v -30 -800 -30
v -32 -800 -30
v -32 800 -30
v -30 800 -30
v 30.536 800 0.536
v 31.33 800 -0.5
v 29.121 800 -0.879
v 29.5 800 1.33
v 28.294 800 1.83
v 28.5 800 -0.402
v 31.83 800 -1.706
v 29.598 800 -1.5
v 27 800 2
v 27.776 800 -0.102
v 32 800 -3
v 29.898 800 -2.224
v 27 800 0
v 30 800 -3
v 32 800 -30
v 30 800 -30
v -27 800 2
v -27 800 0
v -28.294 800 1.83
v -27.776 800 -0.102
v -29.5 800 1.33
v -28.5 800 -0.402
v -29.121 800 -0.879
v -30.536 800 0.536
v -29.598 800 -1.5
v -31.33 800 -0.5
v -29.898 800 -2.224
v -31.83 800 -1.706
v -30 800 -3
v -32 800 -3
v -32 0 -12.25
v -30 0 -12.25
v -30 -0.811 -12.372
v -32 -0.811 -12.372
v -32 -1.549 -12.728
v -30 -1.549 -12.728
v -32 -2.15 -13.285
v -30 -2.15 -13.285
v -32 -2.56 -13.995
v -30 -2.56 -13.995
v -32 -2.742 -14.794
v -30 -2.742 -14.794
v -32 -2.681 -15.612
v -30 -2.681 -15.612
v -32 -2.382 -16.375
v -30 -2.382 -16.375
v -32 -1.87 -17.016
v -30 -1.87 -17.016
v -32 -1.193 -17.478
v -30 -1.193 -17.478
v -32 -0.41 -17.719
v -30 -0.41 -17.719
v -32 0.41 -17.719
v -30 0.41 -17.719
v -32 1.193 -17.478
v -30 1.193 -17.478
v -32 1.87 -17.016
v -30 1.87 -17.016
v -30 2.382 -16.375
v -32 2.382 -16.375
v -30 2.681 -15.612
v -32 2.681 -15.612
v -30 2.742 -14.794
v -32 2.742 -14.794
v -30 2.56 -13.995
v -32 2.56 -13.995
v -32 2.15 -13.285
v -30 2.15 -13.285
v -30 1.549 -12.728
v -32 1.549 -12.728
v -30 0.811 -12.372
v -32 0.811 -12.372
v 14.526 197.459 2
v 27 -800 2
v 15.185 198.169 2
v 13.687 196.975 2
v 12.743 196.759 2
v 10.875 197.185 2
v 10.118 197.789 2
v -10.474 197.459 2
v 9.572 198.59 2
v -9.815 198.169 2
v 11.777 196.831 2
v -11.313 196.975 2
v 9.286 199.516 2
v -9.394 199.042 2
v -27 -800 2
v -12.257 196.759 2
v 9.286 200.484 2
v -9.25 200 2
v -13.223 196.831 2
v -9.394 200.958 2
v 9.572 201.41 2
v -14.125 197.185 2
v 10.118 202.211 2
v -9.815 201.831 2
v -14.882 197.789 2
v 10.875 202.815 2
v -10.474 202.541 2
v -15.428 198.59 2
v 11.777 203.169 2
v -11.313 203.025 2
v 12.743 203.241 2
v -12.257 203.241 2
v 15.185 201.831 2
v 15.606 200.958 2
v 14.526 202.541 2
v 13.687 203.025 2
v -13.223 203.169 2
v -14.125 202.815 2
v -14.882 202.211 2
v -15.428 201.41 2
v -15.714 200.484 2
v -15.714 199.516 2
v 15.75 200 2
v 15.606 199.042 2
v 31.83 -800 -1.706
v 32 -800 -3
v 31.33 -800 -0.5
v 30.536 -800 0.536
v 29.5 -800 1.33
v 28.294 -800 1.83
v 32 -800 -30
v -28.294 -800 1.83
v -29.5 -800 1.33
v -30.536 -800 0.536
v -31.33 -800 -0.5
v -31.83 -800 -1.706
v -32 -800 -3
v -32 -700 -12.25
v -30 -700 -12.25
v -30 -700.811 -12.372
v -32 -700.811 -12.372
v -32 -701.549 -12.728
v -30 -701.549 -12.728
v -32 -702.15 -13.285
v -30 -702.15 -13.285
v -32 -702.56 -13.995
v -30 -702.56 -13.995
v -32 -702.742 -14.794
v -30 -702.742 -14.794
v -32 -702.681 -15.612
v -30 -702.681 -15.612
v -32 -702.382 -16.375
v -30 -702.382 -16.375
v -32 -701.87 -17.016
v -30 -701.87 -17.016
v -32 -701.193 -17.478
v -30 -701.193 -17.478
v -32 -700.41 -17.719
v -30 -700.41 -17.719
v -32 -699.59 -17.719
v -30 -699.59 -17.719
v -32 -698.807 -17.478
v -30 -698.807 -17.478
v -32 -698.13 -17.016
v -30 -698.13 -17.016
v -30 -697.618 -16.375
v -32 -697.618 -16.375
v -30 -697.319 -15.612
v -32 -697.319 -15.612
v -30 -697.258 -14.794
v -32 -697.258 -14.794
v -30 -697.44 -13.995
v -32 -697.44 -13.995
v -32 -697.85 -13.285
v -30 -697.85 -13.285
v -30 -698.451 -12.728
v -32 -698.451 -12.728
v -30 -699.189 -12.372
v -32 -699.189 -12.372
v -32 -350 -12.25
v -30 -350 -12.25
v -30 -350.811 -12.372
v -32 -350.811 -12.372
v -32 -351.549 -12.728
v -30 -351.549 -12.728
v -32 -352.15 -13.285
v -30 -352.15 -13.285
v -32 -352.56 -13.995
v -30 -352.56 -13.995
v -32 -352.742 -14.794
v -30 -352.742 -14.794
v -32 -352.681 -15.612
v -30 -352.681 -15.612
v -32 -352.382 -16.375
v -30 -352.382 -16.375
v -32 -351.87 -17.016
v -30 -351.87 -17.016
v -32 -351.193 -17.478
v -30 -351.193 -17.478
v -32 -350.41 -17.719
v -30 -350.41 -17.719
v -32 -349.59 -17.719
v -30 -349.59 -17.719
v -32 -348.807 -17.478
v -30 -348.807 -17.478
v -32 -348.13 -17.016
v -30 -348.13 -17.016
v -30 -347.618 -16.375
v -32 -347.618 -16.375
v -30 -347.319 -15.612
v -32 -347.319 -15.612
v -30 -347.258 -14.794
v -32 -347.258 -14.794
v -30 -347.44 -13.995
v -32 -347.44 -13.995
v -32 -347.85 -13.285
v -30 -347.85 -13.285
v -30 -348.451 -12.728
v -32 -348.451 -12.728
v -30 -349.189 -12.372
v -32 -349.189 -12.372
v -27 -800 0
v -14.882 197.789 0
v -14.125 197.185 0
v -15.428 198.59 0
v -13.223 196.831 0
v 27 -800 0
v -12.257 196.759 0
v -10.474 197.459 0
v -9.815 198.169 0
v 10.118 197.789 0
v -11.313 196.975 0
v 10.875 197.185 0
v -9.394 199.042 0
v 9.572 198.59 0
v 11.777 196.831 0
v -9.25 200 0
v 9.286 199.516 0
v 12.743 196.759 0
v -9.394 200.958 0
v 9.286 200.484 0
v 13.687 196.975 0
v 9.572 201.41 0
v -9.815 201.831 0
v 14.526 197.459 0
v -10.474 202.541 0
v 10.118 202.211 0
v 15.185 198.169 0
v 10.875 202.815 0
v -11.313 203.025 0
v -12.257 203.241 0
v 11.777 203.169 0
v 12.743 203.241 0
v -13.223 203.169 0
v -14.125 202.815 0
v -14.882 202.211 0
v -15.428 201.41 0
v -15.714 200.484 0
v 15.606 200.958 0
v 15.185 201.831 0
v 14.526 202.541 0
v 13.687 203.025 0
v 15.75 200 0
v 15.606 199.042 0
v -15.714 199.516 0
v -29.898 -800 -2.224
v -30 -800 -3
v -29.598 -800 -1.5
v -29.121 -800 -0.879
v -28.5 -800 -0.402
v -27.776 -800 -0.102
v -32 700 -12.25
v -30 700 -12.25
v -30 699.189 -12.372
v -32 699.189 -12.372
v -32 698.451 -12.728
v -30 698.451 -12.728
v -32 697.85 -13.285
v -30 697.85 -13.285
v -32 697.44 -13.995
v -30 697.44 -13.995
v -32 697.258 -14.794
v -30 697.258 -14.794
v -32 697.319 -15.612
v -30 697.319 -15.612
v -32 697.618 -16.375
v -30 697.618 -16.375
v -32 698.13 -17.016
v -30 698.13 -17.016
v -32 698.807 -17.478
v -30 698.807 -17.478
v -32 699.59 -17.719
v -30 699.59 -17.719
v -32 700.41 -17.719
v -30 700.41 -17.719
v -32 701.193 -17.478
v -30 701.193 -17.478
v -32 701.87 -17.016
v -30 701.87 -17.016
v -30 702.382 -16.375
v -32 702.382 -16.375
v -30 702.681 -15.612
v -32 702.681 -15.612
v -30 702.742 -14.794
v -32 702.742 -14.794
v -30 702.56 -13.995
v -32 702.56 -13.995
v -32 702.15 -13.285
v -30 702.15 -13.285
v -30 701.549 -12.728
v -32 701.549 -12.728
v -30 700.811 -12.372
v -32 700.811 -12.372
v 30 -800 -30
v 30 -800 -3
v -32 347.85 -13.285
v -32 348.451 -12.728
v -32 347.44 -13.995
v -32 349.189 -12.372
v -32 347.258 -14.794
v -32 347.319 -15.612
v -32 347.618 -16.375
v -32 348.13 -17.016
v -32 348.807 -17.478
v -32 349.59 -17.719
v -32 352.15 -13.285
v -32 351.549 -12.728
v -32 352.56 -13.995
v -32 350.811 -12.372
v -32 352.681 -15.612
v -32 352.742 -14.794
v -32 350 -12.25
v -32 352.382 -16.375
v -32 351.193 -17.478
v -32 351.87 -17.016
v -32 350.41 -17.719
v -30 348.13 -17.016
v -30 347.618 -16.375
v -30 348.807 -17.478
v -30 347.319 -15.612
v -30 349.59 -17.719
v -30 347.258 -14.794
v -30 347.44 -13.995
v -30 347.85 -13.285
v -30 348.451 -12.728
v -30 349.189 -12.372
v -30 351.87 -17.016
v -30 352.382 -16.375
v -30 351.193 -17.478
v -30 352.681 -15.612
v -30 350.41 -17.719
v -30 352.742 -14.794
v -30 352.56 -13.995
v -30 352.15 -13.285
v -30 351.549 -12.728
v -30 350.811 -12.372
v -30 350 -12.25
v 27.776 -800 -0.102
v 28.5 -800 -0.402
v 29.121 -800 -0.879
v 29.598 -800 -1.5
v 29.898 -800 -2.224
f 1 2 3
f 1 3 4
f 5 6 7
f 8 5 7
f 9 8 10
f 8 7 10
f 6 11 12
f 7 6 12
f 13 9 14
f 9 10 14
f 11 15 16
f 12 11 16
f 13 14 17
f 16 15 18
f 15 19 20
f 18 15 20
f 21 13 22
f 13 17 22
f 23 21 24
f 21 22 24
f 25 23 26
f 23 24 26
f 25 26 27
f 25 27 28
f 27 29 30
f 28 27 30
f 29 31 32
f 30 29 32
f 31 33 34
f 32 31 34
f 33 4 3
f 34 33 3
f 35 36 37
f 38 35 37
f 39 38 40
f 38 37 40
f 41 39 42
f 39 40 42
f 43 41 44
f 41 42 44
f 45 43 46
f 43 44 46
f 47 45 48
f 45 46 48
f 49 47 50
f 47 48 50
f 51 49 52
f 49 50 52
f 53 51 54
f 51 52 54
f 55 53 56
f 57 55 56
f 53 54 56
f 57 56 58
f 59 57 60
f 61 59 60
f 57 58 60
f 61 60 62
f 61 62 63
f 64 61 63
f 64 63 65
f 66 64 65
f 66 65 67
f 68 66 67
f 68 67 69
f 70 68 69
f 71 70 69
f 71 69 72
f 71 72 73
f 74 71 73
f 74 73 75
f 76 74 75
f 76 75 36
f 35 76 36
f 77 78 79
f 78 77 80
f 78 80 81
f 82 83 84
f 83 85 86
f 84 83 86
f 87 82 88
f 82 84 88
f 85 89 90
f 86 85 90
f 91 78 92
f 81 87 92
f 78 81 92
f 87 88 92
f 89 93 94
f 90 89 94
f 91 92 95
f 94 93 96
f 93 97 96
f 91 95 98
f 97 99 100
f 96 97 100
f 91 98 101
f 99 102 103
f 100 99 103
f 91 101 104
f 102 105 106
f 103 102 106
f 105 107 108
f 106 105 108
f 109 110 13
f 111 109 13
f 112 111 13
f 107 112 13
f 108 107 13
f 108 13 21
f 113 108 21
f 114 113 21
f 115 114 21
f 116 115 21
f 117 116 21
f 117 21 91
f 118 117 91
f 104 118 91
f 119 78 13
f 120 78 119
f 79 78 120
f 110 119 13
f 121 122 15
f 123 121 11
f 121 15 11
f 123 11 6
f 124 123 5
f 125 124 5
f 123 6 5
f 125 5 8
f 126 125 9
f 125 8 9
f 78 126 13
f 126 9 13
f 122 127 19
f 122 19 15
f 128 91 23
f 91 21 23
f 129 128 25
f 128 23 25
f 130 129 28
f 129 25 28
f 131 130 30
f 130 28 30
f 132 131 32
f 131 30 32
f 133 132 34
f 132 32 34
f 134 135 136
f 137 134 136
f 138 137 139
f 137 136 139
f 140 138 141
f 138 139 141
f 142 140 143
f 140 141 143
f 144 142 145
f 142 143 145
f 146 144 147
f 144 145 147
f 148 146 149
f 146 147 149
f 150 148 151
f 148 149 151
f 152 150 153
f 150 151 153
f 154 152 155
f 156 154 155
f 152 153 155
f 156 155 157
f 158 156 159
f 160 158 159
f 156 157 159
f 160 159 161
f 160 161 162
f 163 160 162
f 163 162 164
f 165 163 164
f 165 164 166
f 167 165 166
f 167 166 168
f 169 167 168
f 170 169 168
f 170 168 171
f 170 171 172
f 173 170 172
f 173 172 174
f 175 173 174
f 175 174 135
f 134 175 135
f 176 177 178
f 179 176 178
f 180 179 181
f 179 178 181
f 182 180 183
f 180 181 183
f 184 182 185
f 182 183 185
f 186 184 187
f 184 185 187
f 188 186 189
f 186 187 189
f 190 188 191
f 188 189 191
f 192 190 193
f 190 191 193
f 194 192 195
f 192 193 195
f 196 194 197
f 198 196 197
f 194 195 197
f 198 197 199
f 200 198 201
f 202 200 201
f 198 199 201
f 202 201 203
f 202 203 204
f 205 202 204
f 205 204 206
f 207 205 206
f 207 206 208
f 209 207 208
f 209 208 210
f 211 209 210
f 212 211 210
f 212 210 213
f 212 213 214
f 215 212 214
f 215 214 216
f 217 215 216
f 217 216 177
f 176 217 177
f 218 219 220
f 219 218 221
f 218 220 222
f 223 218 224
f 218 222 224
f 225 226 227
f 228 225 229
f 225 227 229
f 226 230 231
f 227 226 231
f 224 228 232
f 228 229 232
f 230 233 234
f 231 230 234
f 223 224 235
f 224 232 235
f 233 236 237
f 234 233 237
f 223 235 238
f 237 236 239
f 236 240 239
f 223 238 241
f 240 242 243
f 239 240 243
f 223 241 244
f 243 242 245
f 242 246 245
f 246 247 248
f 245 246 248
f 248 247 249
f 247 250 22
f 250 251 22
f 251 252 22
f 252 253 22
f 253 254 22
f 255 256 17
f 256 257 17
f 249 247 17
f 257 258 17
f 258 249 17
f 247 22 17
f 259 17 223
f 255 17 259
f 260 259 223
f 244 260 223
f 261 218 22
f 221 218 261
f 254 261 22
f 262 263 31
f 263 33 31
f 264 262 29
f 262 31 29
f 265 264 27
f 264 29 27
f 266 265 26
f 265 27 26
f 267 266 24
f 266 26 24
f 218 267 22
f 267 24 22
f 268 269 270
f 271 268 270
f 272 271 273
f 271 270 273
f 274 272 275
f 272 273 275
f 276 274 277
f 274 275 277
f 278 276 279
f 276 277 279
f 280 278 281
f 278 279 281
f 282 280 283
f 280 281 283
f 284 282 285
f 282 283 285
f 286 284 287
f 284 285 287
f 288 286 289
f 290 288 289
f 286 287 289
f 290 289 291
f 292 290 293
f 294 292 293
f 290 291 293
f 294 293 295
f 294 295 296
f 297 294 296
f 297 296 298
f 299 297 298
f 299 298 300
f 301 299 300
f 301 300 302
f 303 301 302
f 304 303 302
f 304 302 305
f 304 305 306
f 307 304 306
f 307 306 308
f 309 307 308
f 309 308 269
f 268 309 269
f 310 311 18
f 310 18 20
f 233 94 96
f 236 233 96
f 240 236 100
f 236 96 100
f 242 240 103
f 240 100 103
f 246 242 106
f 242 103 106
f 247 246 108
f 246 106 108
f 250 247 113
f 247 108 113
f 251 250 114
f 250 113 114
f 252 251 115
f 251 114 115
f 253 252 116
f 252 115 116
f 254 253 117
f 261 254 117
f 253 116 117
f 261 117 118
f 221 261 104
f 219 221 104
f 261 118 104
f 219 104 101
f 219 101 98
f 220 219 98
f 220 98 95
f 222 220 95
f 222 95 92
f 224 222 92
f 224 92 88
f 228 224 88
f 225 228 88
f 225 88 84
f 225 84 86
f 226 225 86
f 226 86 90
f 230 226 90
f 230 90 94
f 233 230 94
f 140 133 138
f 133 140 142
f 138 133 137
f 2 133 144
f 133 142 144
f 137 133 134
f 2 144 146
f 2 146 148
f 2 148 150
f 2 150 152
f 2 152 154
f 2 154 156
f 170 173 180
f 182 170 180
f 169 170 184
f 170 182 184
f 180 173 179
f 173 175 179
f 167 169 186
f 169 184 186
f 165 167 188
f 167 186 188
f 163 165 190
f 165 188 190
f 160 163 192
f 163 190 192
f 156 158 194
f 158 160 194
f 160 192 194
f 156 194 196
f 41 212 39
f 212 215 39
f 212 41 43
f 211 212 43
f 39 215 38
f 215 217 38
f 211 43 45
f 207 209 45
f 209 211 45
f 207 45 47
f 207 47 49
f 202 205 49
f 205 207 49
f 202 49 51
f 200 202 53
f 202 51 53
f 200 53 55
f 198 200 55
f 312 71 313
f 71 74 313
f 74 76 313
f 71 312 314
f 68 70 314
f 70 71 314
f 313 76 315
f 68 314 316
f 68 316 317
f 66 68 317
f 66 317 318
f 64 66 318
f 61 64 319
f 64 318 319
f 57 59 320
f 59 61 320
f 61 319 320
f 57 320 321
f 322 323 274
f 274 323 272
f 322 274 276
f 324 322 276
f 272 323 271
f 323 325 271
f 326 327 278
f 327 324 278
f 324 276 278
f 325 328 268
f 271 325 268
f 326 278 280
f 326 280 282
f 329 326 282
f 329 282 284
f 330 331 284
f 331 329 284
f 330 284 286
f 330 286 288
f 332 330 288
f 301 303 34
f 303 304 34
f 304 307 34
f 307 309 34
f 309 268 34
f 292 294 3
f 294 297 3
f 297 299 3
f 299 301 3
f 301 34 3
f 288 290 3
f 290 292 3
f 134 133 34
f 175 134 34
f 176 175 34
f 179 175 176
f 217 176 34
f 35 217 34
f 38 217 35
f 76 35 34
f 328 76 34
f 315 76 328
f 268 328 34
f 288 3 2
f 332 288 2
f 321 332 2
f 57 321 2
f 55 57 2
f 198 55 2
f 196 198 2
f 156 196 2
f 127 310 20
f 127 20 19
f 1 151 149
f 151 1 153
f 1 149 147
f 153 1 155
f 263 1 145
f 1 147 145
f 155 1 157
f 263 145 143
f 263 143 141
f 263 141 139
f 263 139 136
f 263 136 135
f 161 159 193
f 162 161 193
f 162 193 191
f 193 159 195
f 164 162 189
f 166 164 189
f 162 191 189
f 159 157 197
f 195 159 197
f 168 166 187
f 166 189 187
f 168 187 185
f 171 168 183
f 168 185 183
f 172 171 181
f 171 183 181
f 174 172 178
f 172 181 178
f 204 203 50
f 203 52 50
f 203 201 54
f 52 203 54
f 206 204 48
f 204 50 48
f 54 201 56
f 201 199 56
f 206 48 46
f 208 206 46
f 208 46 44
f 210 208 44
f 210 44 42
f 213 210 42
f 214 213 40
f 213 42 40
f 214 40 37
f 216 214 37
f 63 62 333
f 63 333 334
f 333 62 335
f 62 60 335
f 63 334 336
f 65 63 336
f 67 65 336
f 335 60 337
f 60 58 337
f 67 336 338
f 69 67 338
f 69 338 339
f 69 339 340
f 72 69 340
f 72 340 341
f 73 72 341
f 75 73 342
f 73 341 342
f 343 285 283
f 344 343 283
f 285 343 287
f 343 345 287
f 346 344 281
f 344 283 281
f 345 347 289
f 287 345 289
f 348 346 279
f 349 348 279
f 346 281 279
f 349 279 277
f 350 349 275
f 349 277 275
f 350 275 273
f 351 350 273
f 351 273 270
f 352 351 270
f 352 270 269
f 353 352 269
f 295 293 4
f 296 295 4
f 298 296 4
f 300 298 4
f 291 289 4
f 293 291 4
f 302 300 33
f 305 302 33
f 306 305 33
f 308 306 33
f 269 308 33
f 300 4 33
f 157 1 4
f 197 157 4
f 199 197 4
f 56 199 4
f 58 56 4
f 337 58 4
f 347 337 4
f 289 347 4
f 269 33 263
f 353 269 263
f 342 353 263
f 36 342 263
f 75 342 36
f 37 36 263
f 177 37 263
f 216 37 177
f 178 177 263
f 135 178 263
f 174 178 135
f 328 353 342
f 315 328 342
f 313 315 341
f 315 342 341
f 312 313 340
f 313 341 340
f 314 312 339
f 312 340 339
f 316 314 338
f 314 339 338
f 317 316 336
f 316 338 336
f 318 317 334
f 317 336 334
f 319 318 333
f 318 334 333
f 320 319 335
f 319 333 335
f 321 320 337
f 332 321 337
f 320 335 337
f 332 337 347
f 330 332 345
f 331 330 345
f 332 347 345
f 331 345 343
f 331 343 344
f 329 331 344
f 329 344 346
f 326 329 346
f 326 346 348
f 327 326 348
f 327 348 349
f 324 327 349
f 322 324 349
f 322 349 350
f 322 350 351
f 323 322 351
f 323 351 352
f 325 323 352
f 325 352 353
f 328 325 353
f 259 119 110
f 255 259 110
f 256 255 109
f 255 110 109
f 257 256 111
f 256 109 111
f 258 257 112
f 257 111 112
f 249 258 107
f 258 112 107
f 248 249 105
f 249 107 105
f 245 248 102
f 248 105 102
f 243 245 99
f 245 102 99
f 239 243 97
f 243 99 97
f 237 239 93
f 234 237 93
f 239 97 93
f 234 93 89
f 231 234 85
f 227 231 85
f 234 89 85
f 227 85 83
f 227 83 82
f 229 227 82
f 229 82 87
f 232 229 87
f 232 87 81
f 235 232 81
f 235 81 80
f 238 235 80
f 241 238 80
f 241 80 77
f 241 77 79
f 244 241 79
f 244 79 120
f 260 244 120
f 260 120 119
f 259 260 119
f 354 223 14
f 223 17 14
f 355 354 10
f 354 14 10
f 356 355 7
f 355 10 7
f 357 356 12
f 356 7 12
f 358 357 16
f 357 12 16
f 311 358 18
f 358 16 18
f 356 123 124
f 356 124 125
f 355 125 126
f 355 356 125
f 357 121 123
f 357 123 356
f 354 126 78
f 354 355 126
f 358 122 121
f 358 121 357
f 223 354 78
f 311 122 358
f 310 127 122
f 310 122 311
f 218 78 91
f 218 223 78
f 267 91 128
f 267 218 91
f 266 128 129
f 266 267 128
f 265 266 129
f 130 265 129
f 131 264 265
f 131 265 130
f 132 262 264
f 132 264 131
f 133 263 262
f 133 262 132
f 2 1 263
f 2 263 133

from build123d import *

# Parameters (mm, degrees)
SM_BASE_FLANGE_1_DEPTH      = 800
HOLE_WIZARD_5_5_5_5_1_D     = 5.5
HOLE_WIZARD_5_5_5_5_1_DEPTH = 2
HOLE_WIZARD_6_5_6_5_1_D     = 6.5


# Sheet-metal steps are written as plain solids
with BuildPart() as part:
    # Sketch 1 → 基体-法兰1 (new, symmetric)
    with BuildSketch(Plane(origin=(0, 0, 0), x_dir=(1, 0, 0), z_dir=(0, 1, 0))):
        with BuildLine():
            Line((-30, 30), (-30, 3))
            ThreePointArc((-30, 3), (-29.121320344, 0.878679656), (-27, 0))
            Line((-27, 0), (27, 0))
            ThreePointArc((27, 0), (29.121320344, 0.878679656), (30, 3))
            Line((30, 3), (30, 30))
            Line((30, 30), (32, 30))
            Line((32, 30), (32, 3))
            ThreePointArc((32, 3), (30.535533906, -0.535533906), (27, -2))
            Line((27, -2), (-27, -2))
            ThreePointArc((-27, -2), (-30.535533906, -0.535533906), (-32, 3))
            Line((-32, 3), (-32, 30))
            Line((-32, 30), (-30, 30))
        make_face()
    extrude(amount=SM_BASE_FLANGE_1_DEPTH, both=True)

    # Ø5.5 (5.5) 直径孔1
    with Locations(Plane(origin=(-32, 700, -15), x_dir=(0, 0, -1), z_dir=(-1, 0, 0))):
        with Locations((0, 0), (0, 350), (0, 700), (0, 1050), (0, 1400)):
            Hole(HOLE_WIZARD_5_5_5_5_1_D / 2, depth=HOLE_WIZARD_5_5_5_5_1_DEPTH)

    # Ø6.5 (6.5) 直径孔1 (through all)
    with Locations(Plane(origin=(-12.5, 200, 0), x_dir=(-1, 0, 0), z_dir=(0, 0, -1))):
        with Locations((0, 0), (-25, 0)):
            Hole(HOLE_WIZARD_6_5_6_5_1_D / 2)


solid = part.part
